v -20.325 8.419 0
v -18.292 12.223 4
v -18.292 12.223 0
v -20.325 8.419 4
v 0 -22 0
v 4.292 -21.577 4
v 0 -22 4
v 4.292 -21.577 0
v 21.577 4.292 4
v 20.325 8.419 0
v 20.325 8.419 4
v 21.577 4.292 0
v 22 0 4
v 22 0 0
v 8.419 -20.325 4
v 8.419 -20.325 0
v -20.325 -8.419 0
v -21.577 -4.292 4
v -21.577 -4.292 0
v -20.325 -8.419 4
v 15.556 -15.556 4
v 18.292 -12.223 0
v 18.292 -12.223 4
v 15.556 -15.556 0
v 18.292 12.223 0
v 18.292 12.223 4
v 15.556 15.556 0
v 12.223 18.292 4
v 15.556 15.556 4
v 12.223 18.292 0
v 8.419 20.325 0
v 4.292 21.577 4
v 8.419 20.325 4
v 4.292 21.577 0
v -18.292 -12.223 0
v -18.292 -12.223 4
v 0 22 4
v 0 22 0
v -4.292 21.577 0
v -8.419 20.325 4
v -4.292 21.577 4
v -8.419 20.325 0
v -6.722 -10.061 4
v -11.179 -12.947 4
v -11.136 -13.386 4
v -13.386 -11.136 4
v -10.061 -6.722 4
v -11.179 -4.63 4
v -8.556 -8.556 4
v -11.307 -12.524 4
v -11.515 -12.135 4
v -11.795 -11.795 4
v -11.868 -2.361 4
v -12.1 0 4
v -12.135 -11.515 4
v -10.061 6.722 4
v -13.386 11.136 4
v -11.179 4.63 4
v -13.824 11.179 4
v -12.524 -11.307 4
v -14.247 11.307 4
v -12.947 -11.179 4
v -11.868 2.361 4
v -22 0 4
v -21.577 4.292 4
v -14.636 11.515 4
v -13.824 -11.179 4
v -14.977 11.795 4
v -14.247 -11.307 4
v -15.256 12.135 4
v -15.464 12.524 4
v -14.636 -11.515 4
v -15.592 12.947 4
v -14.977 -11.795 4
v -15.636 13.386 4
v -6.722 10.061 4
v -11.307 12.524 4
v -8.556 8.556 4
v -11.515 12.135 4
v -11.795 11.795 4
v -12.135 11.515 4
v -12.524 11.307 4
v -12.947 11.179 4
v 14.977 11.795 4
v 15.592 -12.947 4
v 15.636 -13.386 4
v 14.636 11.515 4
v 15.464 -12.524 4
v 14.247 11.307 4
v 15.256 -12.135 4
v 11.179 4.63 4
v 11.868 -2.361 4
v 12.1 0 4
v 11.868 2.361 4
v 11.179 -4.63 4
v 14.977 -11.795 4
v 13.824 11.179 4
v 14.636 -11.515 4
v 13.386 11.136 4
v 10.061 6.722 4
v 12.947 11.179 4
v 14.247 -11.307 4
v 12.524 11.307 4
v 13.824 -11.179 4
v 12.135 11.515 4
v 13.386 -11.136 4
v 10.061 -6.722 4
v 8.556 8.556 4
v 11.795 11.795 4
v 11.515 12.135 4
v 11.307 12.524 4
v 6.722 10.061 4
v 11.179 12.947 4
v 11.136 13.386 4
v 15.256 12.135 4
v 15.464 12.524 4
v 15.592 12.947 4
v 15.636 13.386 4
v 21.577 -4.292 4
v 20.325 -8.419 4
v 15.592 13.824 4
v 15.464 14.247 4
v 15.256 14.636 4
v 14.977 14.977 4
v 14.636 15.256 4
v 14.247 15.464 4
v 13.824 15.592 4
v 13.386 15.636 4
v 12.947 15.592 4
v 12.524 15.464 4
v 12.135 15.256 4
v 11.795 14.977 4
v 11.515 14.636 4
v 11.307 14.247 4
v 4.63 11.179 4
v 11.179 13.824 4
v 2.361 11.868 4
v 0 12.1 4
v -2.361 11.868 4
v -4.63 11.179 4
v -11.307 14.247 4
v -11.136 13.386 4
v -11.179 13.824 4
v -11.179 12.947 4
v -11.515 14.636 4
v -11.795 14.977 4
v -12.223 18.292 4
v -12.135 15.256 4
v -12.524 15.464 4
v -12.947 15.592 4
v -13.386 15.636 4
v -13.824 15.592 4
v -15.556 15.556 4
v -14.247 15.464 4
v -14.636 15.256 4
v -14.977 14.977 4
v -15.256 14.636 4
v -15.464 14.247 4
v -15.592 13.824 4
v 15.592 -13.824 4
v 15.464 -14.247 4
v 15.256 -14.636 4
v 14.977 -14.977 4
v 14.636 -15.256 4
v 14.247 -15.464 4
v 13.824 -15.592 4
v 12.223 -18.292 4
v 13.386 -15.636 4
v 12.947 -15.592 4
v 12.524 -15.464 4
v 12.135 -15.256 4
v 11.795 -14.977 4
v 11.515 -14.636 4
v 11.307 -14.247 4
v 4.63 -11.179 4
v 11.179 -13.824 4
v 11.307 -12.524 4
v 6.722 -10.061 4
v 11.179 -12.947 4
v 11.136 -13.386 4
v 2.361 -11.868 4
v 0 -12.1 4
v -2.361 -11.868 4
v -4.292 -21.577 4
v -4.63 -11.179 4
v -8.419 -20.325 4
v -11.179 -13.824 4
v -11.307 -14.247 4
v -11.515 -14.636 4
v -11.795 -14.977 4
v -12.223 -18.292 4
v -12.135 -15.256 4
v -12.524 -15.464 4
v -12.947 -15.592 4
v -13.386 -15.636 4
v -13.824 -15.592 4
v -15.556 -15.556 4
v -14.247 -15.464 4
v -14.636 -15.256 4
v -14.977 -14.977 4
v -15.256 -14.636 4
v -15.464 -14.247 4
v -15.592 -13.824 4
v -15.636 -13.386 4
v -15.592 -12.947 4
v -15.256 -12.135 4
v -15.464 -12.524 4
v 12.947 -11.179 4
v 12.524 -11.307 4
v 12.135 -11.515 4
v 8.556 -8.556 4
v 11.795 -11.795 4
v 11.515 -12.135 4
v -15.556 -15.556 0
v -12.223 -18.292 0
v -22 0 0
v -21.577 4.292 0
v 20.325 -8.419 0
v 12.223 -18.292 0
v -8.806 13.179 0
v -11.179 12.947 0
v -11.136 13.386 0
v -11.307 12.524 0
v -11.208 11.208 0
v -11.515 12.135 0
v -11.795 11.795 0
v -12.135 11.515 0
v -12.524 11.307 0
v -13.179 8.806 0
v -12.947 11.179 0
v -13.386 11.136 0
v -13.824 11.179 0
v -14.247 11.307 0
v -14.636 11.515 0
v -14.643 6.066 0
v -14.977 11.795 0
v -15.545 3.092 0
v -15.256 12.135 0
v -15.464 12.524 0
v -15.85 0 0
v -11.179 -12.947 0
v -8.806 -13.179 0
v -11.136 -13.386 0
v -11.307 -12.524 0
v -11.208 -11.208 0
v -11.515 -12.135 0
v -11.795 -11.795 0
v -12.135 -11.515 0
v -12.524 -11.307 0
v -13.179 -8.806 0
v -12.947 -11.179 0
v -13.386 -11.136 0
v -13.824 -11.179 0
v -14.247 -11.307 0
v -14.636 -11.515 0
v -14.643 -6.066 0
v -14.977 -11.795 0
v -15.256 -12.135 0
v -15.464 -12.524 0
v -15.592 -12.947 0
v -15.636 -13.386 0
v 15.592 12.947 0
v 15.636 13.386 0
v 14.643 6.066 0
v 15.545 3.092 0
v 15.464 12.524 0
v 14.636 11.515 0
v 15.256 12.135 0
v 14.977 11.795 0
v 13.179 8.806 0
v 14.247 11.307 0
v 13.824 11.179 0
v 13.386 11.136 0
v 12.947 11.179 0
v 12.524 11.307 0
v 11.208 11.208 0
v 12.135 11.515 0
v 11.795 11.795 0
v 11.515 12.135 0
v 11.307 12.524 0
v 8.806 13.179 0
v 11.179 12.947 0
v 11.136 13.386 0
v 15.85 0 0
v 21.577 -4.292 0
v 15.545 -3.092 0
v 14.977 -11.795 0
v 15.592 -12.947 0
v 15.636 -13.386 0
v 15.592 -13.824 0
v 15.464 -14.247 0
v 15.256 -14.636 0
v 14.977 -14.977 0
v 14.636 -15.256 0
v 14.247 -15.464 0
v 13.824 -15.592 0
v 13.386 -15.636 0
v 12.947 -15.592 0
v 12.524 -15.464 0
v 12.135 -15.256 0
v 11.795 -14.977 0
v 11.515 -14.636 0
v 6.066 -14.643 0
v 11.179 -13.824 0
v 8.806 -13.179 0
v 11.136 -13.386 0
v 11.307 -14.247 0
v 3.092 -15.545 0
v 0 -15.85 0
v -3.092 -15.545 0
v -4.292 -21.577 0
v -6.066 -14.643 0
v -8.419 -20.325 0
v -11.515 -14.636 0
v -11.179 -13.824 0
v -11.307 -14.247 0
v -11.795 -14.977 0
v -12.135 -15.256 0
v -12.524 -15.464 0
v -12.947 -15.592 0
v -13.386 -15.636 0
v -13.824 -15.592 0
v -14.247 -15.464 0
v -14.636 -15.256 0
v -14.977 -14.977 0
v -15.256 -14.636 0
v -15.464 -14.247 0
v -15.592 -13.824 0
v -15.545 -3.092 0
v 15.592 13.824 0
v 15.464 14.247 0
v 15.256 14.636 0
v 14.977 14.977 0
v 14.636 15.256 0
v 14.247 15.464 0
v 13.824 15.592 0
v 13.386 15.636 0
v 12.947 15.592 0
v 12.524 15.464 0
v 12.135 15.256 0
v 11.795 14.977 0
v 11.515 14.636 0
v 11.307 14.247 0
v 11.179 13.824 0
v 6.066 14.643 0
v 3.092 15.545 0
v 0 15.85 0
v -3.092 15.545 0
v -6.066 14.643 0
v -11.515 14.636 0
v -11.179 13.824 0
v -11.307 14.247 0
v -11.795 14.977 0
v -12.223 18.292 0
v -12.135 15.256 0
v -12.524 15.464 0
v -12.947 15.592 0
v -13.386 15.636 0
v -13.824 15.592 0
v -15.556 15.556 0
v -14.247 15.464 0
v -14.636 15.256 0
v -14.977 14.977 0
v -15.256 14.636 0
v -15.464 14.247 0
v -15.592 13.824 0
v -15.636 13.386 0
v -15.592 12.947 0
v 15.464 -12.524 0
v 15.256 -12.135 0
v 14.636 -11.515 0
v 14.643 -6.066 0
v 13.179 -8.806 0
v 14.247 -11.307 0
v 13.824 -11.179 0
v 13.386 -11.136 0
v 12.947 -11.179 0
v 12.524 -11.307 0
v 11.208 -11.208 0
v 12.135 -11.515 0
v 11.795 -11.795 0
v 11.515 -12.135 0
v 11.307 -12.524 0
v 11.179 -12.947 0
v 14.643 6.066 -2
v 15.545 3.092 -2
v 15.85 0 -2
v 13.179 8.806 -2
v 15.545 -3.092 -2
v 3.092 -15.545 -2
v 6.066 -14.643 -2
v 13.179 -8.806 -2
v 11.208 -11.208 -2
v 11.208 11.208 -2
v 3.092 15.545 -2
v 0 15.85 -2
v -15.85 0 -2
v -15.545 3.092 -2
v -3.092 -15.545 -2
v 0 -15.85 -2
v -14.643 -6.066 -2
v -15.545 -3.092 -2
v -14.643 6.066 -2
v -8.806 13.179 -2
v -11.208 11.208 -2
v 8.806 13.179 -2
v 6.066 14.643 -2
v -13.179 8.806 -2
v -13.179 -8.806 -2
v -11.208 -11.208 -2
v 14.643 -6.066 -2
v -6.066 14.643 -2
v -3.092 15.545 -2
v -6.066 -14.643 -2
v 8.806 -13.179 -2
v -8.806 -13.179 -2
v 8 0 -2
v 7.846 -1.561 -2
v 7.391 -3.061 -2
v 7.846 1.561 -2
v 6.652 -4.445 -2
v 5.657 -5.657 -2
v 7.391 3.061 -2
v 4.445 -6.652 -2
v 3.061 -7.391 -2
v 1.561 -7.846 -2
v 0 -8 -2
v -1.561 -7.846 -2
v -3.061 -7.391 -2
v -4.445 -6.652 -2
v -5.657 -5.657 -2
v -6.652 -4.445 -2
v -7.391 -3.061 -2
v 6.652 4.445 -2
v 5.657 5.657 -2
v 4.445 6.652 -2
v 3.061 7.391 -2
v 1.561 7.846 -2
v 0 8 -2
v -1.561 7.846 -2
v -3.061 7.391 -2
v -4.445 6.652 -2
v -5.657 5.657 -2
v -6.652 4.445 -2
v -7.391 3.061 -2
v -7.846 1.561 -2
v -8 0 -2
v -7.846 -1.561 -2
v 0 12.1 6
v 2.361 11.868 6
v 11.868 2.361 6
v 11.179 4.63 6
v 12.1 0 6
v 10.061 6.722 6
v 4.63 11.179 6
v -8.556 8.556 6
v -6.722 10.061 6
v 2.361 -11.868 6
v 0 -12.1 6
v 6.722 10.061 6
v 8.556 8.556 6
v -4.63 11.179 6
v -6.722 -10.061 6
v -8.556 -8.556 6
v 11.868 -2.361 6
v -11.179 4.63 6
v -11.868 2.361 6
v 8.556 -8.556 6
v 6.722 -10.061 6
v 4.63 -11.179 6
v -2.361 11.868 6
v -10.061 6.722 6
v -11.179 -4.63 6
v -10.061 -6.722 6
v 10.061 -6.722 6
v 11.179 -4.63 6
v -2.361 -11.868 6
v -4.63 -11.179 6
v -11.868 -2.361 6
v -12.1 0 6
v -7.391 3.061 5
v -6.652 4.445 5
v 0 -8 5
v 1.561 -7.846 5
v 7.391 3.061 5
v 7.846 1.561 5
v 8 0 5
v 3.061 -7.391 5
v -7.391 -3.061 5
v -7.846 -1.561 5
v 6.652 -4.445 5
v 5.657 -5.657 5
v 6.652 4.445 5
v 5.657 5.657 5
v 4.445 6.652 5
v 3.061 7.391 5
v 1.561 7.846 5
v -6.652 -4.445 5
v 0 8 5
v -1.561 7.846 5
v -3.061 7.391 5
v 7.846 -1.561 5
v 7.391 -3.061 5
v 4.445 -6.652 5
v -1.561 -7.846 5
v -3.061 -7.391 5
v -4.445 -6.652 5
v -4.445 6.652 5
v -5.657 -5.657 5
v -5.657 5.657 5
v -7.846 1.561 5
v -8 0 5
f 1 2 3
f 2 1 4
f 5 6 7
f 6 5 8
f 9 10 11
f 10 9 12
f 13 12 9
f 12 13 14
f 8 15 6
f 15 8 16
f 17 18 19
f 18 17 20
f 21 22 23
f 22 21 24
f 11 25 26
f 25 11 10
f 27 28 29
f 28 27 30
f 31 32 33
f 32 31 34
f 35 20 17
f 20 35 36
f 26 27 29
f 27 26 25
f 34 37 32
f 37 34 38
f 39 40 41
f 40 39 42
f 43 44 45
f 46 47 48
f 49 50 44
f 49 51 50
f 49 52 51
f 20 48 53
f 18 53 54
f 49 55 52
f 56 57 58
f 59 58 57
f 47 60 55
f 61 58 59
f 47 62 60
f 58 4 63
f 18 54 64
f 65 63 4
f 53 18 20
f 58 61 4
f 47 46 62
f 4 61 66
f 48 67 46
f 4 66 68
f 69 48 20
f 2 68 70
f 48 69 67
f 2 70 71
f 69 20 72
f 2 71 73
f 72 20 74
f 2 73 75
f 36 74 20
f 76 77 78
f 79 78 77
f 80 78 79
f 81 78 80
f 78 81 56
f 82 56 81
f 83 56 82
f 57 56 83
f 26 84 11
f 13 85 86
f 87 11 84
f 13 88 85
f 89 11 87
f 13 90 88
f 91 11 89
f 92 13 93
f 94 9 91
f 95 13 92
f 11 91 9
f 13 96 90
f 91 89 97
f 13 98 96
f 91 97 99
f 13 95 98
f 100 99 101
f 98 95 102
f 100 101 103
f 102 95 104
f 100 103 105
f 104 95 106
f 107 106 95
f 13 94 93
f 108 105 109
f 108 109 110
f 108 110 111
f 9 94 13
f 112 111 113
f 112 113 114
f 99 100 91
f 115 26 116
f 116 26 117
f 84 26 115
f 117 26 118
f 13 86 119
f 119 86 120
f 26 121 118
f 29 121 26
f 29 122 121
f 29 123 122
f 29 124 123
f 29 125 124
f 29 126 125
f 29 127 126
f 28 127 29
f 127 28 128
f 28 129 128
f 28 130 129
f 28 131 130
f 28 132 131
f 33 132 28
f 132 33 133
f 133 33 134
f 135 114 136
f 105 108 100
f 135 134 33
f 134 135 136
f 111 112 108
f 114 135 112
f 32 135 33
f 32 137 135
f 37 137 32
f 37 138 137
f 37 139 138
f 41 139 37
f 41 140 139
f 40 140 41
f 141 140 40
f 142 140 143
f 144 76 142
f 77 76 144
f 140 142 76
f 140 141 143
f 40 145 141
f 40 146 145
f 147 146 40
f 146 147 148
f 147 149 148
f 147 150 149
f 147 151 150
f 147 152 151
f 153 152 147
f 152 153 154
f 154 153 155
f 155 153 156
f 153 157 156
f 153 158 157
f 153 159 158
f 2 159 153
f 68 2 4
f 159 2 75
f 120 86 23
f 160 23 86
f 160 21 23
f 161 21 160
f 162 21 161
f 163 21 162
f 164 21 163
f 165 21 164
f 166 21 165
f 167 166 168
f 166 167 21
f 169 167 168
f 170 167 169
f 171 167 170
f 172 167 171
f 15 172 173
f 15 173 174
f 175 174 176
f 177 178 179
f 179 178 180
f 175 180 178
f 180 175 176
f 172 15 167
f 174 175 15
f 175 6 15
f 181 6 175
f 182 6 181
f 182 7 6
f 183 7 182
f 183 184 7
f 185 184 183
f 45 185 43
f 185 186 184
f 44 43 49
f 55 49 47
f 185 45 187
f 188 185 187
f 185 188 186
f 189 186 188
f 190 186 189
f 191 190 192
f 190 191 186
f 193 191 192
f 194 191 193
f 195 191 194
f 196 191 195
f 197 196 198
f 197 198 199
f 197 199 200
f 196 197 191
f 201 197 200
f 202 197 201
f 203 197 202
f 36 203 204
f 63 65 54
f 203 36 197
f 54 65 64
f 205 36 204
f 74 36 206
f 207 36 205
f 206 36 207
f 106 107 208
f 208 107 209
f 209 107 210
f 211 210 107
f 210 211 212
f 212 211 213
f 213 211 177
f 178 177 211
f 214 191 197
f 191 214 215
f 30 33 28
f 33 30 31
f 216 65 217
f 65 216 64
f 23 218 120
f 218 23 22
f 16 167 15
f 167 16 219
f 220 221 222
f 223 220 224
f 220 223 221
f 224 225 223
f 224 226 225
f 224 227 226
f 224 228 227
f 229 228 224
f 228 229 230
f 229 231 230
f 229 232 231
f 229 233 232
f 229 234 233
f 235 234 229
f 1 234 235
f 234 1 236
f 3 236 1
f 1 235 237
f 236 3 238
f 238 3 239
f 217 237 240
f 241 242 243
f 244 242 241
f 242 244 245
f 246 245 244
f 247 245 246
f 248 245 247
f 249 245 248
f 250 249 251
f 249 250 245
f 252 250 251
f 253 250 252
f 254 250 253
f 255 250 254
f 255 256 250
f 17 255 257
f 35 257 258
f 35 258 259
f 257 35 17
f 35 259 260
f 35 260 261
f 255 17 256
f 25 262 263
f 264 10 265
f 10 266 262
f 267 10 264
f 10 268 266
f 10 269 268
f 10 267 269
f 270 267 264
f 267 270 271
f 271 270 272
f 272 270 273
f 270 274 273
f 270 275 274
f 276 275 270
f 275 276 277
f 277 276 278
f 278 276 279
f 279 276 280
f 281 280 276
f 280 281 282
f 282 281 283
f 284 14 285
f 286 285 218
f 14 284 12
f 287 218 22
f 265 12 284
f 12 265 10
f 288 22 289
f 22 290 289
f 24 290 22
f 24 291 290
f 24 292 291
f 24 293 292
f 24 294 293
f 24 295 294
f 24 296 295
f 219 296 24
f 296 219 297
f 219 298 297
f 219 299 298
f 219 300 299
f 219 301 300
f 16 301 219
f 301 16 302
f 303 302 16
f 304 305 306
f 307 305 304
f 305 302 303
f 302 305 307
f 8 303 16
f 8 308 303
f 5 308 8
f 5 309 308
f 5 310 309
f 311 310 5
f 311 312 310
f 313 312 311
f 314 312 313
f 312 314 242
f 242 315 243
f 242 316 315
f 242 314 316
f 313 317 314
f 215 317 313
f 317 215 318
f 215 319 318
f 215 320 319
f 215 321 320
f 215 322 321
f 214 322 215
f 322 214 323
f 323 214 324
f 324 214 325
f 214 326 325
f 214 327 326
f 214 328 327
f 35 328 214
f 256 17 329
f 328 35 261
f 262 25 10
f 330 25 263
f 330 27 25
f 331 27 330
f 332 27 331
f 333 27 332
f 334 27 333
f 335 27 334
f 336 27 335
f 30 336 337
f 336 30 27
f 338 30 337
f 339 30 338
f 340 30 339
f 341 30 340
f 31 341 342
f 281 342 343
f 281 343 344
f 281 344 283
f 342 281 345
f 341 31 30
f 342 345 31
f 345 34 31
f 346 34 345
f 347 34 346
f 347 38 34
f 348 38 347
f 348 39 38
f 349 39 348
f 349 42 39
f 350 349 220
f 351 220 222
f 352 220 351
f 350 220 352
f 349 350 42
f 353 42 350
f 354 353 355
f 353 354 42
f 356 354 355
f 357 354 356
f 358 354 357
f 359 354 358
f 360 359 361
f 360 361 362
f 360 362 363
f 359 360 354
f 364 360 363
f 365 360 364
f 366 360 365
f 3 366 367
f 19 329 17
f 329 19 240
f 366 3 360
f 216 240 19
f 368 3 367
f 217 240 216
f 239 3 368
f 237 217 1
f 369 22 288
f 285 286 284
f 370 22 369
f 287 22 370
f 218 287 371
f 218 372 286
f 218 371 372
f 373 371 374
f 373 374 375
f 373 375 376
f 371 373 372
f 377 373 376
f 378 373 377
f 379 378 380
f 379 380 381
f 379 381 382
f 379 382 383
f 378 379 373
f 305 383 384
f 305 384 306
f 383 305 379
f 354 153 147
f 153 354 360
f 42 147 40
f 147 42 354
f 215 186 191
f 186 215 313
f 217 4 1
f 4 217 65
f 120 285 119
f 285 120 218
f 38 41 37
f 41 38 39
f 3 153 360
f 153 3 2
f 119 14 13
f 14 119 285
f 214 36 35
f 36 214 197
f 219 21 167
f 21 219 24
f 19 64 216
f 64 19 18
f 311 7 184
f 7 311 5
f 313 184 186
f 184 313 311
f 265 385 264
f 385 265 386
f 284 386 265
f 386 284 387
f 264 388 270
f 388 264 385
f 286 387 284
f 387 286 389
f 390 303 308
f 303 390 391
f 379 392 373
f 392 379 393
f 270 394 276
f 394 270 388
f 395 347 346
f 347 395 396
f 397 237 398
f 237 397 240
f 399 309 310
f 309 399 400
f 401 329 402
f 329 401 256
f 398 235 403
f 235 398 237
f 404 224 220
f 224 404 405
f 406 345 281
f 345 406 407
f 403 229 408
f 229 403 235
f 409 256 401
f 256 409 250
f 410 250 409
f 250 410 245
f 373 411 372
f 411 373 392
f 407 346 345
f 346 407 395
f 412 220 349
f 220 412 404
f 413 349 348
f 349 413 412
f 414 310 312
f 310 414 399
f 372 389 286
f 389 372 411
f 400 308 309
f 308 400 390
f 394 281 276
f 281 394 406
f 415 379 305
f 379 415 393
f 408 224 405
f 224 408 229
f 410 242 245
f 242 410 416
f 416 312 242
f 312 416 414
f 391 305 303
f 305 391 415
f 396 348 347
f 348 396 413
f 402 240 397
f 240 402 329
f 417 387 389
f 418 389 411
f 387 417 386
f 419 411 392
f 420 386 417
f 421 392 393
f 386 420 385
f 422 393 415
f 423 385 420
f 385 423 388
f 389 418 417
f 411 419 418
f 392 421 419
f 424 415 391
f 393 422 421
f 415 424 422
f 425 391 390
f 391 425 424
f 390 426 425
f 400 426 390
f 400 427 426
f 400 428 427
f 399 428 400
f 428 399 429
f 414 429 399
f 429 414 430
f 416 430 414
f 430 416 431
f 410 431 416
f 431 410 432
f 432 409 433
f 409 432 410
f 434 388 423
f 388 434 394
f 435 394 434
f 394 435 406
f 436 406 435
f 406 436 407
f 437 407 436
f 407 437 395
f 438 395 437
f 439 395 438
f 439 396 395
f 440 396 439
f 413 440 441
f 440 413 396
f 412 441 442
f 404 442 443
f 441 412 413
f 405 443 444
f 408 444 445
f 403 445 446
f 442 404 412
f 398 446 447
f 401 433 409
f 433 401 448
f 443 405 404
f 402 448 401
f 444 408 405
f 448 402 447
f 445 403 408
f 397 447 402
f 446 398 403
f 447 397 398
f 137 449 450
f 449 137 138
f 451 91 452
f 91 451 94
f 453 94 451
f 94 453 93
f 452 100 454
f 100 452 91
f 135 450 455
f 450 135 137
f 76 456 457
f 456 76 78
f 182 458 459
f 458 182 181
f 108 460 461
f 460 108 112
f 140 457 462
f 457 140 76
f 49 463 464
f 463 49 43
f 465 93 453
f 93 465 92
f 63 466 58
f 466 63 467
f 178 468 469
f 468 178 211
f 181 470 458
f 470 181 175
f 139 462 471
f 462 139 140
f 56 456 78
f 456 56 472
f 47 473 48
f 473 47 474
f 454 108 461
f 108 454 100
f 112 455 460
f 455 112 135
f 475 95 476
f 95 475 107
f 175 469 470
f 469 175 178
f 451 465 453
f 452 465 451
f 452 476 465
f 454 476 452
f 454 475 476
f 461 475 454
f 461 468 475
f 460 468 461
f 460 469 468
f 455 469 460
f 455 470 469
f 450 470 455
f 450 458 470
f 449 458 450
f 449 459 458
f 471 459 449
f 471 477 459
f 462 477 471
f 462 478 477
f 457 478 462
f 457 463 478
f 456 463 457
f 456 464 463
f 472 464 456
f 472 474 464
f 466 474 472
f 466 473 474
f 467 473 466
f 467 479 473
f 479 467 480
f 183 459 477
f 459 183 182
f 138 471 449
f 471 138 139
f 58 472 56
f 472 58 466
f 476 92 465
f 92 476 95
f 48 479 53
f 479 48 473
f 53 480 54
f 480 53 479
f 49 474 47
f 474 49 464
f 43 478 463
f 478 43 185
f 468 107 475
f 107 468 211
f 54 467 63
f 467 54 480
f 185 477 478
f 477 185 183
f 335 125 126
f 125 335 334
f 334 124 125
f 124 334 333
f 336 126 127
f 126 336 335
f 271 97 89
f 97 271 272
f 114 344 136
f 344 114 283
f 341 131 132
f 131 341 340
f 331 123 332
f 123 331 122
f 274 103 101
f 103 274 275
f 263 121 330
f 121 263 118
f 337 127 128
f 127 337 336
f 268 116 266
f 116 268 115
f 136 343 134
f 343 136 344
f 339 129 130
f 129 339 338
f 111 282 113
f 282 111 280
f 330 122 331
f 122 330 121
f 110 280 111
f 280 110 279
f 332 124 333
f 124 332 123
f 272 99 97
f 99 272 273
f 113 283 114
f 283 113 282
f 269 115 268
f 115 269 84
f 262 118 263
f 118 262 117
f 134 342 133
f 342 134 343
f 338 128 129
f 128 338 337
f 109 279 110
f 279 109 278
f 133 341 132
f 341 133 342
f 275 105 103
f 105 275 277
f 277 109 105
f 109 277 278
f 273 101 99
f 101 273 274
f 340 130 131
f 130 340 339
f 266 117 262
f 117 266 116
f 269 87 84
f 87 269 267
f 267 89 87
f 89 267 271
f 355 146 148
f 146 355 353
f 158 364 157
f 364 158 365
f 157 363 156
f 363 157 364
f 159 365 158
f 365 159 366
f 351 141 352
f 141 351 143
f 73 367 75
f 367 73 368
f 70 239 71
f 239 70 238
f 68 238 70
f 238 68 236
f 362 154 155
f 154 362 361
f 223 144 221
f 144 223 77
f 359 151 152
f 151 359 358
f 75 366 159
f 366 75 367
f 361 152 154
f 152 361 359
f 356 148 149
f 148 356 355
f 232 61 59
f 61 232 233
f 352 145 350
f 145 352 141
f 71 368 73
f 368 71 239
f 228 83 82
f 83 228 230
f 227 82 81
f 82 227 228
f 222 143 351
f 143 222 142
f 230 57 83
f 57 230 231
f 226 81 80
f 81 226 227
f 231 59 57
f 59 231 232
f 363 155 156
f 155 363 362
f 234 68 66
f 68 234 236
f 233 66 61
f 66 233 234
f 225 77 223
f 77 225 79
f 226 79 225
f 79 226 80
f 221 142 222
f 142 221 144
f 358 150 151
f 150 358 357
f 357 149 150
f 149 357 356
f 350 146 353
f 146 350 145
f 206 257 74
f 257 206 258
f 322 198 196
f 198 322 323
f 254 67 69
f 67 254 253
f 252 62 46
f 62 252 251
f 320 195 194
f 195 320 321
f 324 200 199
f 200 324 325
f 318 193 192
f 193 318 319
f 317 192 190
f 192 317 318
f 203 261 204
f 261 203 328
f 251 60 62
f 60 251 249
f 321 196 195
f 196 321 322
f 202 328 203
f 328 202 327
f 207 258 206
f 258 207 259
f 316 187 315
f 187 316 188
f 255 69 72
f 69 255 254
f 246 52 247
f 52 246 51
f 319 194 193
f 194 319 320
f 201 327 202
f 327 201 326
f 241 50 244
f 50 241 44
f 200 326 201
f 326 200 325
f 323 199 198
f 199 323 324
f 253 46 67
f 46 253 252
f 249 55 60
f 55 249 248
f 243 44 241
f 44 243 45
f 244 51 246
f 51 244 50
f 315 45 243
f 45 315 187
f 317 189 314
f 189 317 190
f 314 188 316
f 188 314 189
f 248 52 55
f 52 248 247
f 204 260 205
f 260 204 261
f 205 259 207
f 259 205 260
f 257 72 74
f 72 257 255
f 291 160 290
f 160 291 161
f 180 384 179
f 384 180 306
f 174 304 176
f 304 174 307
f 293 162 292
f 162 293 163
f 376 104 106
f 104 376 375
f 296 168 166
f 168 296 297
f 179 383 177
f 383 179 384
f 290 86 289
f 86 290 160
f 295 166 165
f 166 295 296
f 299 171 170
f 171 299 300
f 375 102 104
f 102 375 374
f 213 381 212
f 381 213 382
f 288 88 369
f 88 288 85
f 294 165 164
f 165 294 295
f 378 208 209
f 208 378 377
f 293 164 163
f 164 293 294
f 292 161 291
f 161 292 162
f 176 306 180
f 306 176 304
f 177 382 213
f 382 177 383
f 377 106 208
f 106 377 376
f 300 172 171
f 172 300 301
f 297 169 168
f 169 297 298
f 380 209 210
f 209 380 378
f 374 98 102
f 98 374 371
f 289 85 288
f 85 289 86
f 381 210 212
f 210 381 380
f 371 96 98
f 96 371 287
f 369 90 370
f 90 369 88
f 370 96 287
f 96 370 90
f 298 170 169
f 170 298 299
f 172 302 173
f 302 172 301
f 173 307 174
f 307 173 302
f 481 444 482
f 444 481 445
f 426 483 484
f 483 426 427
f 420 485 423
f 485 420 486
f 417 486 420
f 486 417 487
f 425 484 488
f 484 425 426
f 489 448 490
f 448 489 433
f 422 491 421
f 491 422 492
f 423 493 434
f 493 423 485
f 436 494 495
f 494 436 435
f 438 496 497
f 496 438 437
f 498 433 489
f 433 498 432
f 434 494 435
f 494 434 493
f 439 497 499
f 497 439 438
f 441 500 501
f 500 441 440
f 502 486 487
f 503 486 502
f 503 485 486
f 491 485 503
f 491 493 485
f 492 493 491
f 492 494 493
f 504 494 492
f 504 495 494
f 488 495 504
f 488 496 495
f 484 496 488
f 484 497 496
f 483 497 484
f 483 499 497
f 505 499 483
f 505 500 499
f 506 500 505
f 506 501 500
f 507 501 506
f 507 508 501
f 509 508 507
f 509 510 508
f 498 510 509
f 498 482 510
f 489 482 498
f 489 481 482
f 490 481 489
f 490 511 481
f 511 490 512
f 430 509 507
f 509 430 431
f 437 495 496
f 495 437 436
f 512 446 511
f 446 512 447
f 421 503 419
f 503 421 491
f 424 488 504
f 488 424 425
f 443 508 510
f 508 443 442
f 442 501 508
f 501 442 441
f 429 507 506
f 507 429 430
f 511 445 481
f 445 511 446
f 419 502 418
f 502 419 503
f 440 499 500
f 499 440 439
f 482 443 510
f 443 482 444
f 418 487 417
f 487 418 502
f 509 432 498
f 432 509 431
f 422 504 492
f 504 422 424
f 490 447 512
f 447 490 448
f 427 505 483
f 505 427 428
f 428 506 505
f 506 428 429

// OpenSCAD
$fn = 32;

// ----------------------------------------------------------------------
// Retaining cap: 6002 cover, 44 mm, spigot 31.7 mm
// ----------------------------------------------------------------------

// --- parameters (mm) ---
cap_d = 44;               // cover diameter
cap_t = 4;                // cover thickness
lip_d = 31.7;             // spigot that enters the housing
lip_h = 2;                // spigot height
shaft_d = 16;             // shaft opening
bolt_d = 4.5;             // bolt clearance
bolt_r = 18.93;           // bolt circle radius
dome_h = 2;               // raised centre

module cover() {
  cylinder(h = cap_t, d = cap_d);
}

module spigot() {
  /* sunk 1 mm into the cover; the spigot sets the overall height */
  translate([0, 0, -lip_h]) cylinder(h = lip_h + 1, d = lip_d);
}

module dome() {
  translate([0, 0, cap_t - 1]) cylinder(h = dome_h + 1, d = cap_d * 0.55);
}

difference() {
  union() {
    cover();
    spigot();
    dome();
  }
  for (i = [0 : 3]) rotate([0, 0, 45 + i * 90]) translate([bolt_r, 0, -lip_h - 1])
    cylinder(h = lip_h + cap_t + 2, d = bolt_d);
  translate([0, 0, -lip_h - 1]) cylinder(h = lip_h + cap_t + 2, d = shaft_d);
}
